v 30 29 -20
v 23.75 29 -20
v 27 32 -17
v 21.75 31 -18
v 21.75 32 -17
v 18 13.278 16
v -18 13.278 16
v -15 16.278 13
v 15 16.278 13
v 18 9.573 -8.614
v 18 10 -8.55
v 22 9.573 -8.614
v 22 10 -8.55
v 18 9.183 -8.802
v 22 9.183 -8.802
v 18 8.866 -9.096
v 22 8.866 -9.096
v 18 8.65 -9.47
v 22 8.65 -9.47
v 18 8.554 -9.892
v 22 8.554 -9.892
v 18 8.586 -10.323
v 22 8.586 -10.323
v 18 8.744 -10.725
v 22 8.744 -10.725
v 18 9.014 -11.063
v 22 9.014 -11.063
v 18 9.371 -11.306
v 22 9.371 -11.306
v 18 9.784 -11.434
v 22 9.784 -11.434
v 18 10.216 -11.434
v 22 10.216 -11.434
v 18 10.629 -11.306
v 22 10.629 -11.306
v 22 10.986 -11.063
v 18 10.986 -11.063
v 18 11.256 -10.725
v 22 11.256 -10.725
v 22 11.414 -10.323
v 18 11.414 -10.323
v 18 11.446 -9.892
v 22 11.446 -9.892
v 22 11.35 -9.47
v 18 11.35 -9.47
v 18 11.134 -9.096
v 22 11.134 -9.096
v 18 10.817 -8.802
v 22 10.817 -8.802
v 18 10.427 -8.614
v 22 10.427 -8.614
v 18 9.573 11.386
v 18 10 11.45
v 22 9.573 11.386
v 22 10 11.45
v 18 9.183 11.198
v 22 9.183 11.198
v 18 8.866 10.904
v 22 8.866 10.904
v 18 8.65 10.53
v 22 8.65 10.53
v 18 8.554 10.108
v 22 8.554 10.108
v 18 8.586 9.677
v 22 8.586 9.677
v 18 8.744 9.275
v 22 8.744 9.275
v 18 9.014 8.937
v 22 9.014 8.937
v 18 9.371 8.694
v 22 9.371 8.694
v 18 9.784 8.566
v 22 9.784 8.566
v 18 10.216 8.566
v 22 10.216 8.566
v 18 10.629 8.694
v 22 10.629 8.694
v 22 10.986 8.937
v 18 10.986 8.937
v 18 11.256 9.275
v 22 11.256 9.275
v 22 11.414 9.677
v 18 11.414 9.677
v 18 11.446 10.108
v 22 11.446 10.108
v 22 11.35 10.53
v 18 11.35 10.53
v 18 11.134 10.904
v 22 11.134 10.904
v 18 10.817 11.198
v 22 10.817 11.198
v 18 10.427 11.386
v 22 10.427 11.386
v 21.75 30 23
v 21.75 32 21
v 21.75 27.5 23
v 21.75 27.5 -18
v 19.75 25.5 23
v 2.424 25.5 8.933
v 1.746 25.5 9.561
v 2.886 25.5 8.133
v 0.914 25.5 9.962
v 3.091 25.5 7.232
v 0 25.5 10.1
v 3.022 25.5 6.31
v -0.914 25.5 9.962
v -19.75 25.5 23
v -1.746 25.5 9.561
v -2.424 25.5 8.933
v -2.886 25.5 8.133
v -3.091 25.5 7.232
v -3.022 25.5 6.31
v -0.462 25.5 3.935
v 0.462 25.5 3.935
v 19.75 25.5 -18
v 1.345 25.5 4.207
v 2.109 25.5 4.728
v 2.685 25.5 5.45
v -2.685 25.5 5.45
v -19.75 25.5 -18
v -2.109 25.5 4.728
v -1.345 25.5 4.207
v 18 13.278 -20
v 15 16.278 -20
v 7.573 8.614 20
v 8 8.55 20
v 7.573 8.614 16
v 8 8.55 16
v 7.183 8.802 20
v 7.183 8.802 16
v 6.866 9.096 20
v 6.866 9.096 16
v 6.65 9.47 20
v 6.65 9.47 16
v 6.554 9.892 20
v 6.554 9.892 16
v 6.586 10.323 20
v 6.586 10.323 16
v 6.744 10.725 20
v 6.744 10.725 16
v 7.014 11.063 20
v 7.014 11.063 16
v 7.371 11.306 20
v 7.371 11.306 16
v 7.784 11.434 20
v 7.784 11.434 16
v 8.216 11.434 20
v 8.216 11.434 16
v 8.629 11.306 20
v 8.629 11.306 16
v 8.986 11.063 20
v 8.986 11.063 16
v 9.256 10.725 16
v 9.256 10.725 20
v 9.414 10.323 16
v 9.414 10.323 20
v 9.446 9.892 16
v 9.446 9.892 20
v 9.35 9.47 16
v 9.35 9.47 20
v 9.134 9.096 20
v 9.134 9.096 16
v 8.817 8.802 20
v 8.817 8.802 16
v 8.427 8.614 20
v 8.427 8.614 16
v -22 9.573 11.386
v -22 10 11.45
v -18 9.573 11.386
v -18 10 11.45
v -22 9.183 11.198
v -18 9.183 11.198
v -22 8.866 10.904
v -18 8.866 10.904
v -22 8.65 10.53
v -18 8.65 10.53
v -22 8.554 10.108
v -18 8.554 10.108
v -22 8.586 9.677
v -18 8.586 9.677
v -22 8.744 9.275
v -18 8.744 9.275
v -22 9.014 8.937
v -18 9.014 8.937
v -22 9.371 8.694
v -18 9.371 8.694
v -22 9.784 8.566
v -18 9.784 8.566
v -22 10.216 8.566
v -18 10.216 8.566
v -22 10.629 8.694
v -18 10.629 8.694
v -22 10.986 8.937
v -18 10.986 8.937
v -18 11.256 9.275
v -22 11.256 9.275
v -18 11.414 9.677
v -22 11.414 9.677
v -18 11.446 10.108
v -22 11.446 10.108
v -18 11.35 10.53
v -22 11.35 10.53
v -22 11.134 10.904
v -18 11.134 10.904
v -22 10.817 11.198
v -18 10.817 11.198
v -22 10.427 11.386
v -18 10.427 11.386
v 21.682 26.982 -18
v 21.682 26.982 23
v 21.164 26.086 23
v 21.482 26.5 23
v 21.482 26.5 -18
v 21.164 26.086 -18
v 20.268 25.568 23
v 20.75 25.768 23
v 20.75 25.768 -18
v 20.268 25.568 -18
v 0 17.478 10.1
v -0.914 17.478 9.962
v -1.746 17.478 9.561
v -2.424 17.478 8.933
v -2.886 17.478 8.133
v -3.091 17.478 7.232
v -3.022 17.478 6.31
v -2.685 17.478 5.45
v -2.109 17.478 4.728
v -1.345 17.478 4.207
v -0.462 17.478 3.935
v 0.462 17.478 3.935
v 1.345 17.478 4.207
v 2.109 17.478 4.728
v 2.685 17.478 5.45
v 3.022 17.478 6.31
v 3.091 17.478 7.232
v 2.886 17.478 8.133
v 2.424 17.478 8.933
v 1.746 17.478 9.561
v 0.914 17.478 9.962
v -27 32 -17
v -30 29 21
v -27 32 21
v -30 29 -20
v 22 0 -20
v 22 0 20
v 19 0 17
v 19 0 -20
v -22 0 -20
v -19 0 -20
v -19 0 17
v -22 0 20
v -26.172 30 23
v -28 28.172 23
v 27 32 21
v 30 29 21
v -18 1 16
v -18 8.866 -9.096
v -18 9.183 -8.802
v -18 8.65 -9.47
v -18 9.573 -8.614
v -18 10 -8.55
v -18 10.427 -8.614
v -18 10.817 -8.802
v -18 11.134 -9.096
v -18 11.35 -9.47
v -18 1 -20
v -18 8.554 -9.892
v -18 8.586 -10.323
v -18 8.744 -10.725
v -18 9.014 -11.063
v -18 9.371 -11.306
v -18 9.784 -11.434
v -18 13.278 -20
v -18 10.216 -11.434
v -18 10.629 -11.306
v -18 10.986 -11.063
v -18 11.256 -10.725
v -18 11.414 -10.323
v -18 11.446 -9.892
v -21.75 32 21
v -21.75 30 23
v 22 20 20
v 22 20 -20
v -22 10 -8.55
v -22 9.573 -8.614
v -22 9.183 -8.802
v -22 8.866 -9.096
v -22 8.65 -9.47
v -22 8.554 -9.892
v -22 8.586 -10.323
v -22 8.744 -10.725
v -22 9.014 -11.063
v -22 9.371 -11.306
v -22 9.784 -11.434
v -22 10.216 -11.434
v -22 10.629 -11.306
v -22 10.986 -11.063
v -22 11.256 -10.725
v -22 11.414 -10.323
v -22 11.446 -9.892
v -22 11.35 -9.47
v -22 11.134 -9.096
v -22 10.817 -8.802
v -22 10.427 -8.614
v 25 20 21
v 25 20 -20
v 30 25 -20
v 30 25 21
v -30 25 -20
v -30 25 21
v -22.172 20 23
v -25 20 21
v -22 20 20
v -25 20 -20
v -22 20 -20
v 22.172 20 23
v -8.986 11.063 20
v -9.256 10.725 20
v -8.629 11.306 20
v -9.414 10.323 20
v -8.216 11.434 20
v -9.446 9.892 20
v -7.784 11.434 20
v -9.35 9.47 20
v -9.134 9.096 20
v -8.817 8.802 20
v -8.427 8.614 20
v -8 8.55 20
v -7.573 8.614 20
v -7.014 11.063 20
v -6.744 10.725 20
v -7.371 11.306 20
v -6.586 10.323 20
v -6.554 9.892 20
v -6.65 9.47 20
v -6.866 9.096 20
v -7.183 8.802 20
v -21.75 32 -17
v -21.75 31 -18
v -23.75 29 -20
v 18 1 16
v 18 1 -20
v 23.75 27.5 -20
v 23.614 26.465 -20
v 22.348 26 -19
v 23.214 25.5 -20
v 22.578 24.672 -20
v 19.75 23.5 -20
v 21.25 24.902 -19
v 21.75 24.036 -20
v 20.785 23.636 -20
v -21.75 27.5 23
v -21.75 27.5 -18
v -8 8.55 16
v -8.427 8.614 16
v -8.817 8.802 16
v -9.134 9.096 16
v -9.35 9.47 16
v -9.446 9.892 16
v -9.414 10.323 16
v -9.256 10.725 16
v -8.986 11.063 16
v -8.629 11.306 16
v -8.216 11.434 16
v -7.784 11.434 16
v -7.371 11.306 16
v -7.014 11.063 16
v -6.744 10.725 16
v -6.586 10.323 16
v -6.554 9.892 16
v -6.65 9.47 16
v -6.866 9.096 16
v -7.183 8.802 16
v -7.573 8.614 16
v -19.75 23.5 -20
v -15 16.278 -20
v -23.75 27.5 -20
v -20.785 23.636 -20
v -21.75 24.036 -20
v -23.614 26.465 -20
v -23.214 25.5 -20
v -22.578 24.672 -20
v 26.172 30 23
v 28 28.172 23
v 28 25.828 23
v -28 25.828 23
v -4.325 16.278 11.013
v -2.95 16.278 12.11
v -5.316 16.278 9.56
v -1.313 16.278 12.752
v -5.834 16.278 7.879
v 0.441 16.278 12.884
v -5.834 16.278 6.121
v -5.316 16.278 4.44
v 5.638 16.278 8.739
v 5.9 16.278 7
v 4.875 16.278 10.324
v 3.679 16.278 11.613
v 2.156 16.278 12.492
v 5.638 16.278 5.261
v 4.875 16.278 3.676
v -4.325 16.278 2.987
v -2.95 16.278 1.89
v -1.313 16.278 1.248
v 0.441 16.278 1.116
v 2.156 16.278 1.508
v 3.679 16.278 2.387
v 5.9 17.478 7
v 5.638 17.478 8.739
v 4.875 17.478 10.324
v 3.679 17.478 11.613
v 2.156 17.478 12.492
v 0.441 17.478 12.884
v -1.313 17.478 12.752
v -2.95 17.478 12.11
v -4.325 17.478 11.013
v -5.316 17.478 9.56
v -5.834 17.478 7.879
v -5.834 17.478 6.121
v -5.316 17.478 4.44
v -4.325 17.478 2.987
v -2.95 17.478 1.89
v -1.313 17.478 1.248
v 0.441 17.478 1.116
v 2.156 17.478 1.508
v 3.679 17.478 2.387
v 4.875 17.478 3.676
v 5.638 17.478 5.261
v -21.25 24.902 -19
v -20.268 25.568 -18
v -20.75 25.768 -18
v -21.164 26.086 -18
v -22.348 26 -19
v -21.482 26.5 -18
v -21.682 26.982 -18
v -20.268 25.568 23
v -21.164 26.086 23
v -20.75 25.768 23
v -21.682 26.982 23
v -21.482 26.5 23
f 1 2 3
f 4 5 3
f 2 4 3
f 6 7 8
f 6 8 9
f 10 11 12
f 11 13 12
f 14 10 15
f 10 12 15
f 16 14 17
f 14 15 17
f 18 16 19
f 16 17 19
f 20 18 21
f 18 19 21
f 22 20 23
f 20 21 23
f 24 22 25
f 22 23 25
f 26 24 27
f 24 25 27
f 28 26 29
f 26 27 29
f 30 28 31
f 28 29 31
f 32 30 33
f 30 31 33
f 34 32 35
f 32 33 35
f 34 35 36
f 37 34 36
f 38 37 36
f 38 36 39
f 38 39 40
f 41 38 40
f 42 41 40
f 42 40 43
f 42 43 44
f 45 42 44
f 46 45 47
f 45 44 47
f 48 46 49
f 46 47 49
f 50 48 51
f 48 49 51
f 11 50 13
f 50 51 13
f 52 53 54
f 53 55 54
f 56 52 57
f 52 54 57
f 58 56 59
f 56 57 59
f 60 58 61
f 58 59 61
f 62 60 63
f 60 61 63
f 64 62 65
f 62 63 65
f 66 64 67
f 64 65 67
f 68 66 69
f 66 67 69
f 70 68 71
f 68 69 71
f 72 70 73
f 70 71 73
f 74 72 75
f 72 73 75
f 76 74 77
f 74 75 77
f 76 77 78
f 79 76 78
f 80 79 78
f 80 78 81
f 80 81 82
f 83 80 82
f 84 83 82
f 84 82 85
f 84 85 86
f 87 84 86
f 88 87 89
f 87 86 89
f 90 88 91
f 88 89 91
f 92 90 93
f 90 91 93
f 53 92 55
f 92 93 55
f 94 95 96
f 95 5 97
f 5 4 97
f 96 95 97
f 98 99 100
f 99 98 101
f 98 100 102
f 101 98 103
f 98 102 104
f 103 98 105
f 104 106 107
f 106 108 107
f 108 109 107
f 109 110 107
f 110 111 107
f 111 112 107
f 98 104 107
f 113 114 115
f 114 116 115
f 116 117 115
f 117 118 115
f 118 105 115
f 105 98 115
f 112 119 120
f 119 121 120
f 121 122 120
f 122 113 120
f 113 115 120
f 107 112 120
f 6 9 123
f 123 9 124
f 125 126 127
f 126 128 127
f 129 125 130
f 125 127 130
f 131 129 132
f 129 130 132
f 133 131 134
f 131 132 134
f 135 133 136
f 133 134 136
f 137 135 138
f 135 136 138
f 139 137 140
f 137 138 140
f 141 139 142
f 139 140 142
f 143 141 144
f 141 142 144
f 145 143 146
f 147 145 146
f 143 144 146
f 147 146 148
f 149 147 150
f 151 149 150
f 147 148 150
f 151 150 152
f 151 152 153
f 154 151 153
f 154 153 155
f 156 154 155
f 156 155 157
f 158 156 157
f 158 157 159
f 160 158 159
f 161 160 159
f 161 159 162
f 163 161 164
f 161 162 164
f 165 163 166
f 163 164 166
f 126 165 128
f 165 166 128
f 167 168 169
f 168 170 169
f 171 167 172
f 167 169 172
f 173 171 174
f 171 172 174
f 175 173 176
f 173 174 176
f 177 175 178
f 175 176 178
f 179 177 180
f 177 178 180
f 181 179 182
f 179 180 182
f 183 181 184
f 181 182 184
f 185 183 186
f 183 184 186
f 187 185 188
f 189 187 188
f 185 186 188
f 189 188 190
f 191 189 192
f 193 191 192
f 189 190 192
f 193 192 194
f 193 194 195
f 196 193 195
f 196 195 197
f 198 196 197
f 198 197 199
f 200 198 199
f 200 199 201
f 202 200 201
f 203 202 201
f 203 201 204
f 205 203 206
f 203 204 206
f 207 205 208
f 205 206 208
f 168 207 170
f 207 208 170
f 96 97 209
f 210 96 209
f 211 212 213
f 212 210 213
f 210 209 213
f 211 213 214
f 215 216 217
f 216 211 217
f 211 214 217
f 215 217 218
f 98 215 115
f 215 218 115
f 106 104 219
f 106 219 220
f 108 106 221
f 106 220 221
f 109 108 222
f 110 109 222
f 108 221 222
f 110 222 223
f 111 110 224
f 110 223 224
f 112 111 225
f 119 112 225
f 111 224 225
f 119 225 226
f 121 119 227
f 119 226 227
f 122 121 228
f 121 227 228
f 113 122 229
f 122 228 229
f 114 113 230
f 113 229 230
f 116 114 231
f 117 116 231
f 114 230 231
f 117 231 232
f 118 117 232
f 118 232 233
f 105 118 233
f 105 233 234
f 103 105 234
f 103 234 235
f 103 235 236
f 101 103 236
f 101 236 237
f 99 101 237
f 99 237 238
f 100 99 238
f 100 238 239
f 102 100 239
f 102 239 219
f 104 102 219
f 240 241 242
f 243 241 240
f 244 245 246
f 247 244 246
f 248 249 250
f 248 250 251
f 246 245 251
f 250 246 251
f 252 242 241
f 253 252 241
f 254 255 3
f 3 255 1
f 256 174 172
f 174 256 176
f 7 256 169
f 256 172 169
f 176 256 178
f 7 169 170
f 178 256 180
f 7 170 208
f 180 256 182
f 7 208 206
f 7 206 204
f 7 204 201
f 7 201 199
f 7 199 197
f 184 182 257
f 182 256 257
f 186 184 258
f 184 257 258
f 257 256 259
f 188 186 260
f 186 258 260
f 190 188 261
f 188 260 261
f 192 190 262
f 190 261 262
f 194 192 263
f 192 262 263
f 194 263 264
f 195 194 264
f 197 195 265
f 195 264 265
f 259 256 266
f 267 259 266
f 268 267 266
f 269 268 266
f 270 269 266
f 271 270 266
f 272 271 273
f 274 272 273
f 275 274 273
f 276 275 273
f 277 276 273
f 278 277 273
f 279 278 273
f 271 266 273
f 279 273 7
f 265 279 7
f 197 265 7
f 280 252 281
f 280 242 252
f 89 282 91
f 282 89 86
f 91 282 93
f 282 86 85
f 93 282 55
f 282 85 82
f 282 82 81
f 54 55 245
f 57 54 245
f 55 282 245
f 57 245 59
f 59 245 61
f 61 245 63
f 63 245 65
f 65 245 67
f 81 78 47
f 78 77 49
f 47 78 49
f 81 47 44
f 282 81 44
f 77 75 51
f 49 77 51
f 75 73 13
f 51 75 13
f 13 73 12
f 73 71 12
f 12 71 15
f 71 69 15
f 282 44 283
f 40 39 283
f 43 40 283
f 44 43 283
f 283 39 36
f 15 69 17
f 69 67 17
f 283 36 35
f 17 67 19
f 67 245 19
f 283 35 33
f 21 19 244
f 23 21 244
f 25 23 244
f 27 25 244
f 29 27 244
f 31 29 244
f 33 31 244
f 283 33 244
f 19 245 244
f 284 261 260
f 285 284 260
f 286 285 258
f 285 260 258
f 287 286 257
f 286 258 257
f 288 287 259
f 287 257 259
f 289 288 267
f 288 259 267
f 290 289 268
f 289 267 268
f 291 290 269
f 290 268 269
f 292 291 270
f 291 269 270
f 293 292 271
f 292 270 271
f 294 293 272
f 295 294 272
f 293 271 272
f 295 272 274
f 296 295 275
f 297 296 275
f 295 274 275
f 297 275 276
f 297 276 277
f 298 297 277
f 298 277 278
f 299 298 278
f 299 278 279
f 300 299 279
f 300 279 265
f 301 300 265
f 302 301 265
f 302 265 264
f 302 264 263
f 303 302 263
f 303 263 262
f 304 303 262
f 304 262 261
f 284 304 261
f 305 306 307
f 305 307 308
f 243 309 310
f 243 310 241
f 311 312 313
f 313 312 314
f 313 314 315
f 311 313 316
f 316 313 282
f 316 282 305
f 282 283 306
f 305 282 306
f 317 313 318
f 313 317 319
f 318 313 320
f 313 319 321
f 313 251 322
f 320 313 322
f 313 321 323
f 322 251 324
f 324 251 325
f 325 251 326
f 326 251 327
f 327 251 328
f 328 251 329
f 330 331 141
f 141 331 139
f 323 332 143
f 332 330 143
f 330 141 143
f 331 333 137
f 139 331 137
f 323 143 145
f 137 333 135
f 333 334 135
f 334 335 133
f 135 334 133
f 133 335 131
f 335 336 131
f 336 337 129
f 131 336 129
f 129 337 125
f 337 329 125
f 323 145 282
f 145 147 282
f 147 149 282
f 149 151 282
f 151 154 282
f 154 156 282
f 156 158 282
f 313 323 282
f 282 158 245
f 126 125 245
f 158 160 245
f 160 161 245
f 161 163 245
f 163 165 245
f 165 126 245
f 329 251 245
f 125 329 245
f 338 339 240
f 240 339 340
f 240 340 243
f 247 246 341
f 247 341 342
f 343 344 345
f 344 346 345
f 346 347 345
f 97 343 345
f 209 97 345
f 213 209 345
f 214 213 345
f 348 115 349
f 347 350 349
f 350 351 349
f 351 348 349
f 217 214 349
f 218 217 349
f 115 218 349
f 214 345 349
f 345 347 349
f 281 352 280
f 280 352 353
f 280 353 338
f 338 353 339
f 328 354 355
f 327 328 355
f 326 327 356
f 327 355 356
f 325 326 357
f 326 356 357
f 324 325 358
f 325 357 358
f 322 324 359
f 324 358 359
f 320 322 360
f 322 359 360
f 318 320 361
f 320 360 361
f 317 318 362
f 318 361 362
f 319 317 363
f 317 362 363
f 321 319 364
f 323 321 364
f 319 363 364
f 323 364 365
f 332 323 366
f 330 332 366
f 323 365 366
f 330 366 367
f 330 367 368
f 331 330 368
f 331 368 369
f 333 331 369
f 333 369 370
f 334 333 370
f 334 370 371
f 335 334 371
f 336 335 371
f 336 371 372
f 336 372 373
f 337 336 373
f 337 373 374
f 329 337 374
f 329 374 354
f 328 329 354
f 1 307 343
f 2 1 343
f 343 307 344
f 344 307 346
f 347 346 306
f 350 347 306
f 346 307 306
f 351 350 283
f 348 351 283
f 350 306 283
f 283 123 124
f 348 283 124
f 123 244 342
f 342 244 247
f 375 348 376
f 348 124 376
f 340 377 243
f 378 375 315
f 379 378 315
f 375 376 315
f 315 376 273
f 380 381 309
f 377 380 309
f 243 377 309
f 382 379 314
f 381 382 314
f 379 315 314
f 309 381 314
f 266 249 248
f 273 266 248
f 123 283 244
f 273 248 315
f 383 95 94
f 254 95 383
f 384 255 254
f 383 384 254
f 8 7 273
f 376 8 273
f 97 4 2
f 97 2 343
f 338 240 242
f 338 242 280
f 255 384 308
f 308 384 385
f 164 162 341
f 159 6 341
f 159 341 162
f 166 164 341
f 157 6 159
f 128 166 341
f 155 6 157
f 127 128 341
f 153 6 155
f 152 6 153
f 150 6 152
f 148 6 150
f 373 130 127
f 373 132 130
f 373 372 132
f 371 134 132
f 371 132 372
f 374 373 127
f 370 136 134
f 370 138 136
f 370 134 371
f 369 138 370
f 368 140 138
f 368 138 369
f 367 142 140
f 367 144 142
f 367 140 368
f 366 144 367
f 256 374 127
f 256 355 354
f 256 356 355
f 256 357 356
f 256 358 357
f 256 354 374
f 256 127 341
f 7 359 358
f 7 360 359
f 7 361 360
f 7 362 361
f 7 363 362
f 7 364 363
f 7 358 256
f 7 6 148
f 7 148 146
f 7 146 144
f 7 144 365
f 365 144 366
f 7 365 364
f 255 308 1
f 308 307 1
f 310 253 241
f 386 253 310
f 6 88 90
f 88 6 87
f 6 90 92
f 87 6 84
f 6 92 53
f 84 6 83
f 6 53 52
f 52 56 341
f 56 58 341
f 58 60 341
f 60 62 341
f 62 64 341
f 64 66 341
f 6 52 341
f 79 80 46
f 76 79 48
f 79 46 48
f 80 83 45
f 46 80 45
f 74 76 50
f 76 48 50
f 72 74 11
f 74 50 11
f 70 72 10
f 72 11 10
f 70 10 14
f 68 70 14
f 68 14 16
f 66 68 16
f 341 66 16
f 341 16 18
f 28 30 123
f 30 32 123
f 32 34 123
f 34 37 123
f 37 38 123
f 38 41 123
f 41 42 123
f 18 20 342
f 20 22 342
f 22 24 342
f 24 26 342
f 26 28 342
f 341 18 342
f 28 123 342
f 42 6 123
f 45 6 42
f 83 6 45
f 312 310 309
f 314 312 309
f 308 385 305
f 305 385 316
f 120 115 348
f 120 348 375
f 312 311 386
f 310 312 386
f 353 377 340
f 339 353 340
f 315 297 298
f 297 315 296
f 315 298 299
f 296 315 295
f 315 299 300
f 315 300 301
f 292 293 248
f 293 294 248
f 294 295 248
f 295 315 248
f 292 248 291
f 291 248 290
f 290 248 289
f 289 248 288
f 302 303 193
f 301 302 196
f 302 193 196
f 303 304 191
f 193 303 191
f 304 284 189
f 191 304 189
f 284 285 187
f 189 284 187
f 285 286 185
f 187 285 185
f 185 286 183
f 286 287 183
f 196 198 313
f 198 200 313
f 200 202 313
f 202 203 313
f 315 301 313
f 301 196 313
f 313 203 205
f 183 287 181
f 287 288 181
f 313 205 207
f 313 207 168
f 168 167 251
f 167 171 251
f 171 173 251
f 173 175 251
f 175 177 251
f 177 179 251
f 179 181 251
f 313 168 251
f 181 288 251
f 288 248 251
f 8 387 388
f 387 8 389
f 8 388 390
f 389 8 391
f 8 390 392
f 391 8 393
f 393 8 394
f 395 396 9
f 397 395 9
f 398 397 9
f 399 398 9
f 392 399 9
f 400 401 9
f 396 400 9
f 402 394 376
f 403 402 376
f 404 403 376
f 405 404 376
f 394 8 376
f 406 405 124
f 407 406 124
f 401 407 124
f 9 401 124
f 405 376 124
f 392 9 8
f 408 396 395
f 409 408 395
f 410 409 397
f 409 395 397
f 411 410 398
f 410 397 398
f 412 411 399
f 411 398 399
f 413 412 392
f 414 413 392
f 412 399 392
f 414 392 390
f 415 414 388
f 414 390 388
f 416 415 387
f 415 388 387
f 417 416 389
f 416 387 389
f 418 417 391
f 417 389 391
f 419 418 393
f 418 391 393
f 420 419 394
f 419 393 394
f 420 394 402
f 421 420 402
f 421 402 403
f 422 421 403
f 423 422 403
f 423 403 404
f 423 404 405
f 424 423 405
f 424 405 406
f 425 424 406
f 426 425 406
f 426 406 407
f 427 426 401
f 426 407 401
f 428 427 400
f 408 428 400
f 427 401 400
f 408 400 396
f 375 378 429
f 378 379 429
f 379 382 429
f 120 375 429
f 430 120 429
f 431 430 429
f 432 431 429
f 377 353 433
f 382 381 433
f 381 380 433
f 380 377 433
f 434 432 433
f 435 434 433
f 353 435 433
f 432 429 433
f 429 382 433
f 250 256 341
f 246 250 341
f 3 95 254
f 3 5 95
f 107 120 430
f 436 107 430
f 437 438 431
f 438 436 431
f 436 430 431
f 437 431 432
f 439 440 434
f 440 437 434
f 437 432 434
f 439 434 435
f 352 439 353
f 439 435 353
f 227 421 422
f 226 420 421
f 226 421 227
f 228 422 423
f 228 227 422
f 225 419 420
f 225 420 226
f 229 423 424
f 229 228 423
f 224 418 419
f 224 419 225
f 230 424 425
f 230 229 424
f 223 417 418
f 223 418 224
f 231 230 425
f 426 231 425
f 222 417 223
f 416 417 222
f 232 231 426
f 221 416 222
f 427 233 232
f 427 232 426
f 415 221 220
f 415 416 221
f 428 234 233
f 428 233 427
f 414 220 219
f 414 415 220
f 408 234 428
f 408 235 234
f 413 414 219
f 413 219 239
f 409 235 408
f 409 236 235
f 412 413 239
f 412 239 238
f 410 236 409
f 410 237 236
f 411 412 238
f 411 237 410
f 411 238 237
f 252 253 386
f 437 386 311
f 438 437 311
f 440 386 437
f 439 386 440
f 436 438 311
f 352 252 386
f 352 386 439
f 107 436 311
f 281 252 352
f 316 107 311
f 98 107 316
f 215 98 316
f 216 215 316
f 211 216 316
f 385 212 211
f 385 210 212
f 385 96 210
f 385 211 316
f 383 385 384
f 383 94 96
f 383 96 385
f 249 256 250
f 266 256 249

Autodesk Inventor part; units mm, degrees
ref_plane "YZ Plane" through (0, 0, 0) normal (1, 0, 0) x (0, 1, 0)
ref_plane "XZ Plane" through (0, 0, 0) normal (0, 1, 0) x (-1, 0, 0)
ref_plane "XY Plane" through (0, 0, 0) normal (0, 0, 1) x (1, 0, 0)
sketch "Sketch1" plane through (0, 0, 0) normal (0, 1, 0) x (-1, 0, 0)
  line L0 (22, 20) -> (-22, 20)
  line L1 (-22, 20) -> (-22, -20)
  line L2 (-22, -20) -> (22, -20)
  line L3 (22, -20) -> (22, 20)
  line L4 (0, -20) -> (0, 20)
  line L5 (22, 0) -> (-22, 0)
  point P0 (0, 0)
  dimension "d0" = 44
  dimension "d1" = 40
extrude "Extrusion1" add sketch "Sketch1" along normal blind 20
sketch "Sketch2" plane through (0, 20, 0) normal (0, 1, 0) x (1, 0, 0)
  line L0 (22, 20) -> (-22, 20) projected
  line L1 (-22, 20) -> (-22, -20) projected
  line L2 (-22, -20) -> (22, -20) projected
  line L3 (22, -20) -> (22, 20) projected
  line L4 (-30, -41.7016) -> (-30, 48.9081)
  line L5 (30, 51.5024) -> (30, -37.5698)
  line L6 (-22, -20) -> (22, -20) projected
  line L7 (-22, -20) -> (-30, -20)
  line L8 (-22, 20) -> (-22, -20) projected
  line L9 (-22, 20) -> (-30, 20)
  line L10 (22, -20) -> (22, 20) projected
  line L11 (22, 20) -> (30, 20)
  line L12 (22, -20) -> (30, -20)
  point P0 (0, 0)
  dimension "d4" = 30
  dimension "d5" = 30
extrude "Extrusion2" add sketch "Sketch2" along normal blind 12
sketch "Sketch3" plane through (0, 32, 0) normal (0, 1, 0) x (1, 0, 0)
  line L0 (22, 20) -> (-22, 20) projected
  line L1 (-22, -20) -> (22, -20) projected
  line L2 (-21.75, 20) -> (21.75, 20)
  line L3 (21.75, 20) -> (21.75, -20)
  line L4 (21.75, -20) -> (-21.75, -20)
  line L5 (-21.75, -20) -> (-21.75, 20)
  line L6 (-21.75, 0) -> (21.75, 0)
  point P0 (0, 0)
  dimension "d8" = 21.75
  dimension "d9" = 21.75
extrude "Extrusion3" cut sketch "Sketch3" against normal blind 6.5
fillet "Fillet1" radius 2 2 edges at (-21.75, 25.5, 0) (21.75, 25.5, 0)
sketch "Sketch4" plane through (-22, 0, 20) normal (0, 0, 1) x (1, 0, 0)
  line L0 (0.25, 27.5) -> (0.25, 32) projected
  line L1 (-8, 32) -> (0.25, 32) projected
  line L2 (-8, 20) -> (-8, 32) projected
  line L3 (-8, 20) -> (0, 20) projected
  line L4 (0, 0) -> (0, 20) projected
  line L5 (0, 0) -> (44, 0) projected
  line L6 (44, 0) -> (44, 20) projected
  line L7 (44, 20) -> (52, 20) projected
  line L8 (52, 20) -> (52, 32) projected
  line L9 (43.75, 32) -> (52, 32) projected
  line L10 (43.75, 32) -> (43.75, 27.5) projected
  arc A0 (41.75, 25.5) -> (43.75, 27.5) centre (41.75, 27.5) ccw projected
  line L11 (41.75, 25.5) -> (2.25, 25.5) projected
  arc A1 (0.25, 27.5) -> (2.25, 25.5) centre (2.25, 27.5) ccw projected
  line L12 (-8, 20) -> (0, 20) projected
  line L13 (0, 20) -> (44, 20)
  point P0 (22, 0)
extrude "Extrusion4" add sketch "Sketch4" along normal blind 3 contours A1 L11 A0 L10 L9 L8 L7 L13 L3 L2 L1 L0
chamfer "Chamfer1" distance 3 angle 45 4 edges at (25.875, 32, -20) (-25.875, 32, -20) (30, 32, 1.5) (-30, 32, 1.5)
sketch "Sketch5" plane through (22, 0, -20) normal (0, 0, -1) x (-1, 0, 0)
  line L0 (0, 0) -> (44, 0) projected
  line L1 (4, 0) -> (40, 0)
  line L2 (40, 0) -> (40, 16.2778)
  line L3 (40, 16.2778) -> (4, 16.2778)
  line L4 (4, 16.2778) -> (4, 0)
  line L5 (0, 0) -> (0, 20) projected
  line L6 (44, 0) -> (44, 20) projected
  point P0 (22, 0)
  dimension "d18" = 4
  dimension "d19" = 4
extrude "Extrusion5" cut sketch "Sketch5" against normal blind 36
chamfer "Chamfer2" distance 3 angle 45 3 edges at (18, 16.2778, -2) (-18, 16.2778, -2) (0, 16.2778, 16)
sketch "Sketch6" plane through (-22, 0, -20) normal (-1, 0, 0) x (0, 0, 1)
  line L0 (10, 10) -> (30, 10) construction
  line L1 (0, 0) -> (0, 20) projected
  line L2 (0, 20) -> (43, 20) projected
  point P0 (20, 0)
  dimension "d25" = 10
  dimension "d26" = 10
  dimension "d53" = 20
hole "Hole1" at (-22, 10, -10) at (-22, 10, 10) direction (1, 0, 0) diameter 2.9 end through all
sketch "Sketch7" plane through (-22, 0, 20) normal (0, 0, 1) x (1, 0, 0)
  line L0 (14, 10) -> (30, 10) construction
  line L1 (-8, 20) -> (52, 20) projected
  line L2 (0, 0) -> (0, 20) projected
  point P0 (22, 0)
  dimension "d34" = 10
  dimension "d35" = 16
  dimension "d36" = 14
hole "Hole2" at (-8, 10, 20) at (8, 10, 20) direction (0, 0, -1) diameter 2.9 end through all
chamfer "Chamfer3" distance 1 angle 45 3 edges at (18, 0, -2) (0, 0, 16) (-18, 0, -2)
chamfer "Chamfer4" distance 2 angle 45 5 edges at (0, 25.5, -20) (21.1642, 26.0858, -20) (21.75, 28.25, -20) (-21.1642, 26.0858, -20) (-21.75, 28.25, -20)
chamfer "Chamfer5" distance 5 angle 45 2 edges at (30, 20, 1.5) (-30, 20, 1.5)
chamfer "Chamfer6" distance 2 angle 45 8 edges at (-27.5, 22.5, 23) (-30, 27, 23) (-28.5, 30.5, 23) (-24.375, 32, 23) (27.5, 22.5, 23) (30, 27, 23) (28.5, 30.5, 23) (24.375, 32, 23)
sketch "Sketch8" plane through (0, 25.5, 0) normal (0, 1, 0) x (1, 0, 0)
  line L0 (19.75, 20) -> (-19.75, 20) projected
  point P0 (0, 0)
  point P1 (0, -7)
  dimension "d57" = 27
hole "Hole3" at (0, 25.5, 7) direction (0, -1, 0) diameter 6.2 end through all
sketch "Sketch9" plane through (-15, 16.2778, -20) normal (0, -1, 0) x (1, 0, 0)
  circle A0 centre (15, 27) radius 3.1 projected
  circle A1 centre (15, 27) radius 5.9
  point P0 (15, 20)
  dimension "d65" = 2.8
extrude "Extrusion6" cut sketch "Sketch9" against normal blind 1.2
equation "\"d9\" = d8"
properties part number "Camera mount"
